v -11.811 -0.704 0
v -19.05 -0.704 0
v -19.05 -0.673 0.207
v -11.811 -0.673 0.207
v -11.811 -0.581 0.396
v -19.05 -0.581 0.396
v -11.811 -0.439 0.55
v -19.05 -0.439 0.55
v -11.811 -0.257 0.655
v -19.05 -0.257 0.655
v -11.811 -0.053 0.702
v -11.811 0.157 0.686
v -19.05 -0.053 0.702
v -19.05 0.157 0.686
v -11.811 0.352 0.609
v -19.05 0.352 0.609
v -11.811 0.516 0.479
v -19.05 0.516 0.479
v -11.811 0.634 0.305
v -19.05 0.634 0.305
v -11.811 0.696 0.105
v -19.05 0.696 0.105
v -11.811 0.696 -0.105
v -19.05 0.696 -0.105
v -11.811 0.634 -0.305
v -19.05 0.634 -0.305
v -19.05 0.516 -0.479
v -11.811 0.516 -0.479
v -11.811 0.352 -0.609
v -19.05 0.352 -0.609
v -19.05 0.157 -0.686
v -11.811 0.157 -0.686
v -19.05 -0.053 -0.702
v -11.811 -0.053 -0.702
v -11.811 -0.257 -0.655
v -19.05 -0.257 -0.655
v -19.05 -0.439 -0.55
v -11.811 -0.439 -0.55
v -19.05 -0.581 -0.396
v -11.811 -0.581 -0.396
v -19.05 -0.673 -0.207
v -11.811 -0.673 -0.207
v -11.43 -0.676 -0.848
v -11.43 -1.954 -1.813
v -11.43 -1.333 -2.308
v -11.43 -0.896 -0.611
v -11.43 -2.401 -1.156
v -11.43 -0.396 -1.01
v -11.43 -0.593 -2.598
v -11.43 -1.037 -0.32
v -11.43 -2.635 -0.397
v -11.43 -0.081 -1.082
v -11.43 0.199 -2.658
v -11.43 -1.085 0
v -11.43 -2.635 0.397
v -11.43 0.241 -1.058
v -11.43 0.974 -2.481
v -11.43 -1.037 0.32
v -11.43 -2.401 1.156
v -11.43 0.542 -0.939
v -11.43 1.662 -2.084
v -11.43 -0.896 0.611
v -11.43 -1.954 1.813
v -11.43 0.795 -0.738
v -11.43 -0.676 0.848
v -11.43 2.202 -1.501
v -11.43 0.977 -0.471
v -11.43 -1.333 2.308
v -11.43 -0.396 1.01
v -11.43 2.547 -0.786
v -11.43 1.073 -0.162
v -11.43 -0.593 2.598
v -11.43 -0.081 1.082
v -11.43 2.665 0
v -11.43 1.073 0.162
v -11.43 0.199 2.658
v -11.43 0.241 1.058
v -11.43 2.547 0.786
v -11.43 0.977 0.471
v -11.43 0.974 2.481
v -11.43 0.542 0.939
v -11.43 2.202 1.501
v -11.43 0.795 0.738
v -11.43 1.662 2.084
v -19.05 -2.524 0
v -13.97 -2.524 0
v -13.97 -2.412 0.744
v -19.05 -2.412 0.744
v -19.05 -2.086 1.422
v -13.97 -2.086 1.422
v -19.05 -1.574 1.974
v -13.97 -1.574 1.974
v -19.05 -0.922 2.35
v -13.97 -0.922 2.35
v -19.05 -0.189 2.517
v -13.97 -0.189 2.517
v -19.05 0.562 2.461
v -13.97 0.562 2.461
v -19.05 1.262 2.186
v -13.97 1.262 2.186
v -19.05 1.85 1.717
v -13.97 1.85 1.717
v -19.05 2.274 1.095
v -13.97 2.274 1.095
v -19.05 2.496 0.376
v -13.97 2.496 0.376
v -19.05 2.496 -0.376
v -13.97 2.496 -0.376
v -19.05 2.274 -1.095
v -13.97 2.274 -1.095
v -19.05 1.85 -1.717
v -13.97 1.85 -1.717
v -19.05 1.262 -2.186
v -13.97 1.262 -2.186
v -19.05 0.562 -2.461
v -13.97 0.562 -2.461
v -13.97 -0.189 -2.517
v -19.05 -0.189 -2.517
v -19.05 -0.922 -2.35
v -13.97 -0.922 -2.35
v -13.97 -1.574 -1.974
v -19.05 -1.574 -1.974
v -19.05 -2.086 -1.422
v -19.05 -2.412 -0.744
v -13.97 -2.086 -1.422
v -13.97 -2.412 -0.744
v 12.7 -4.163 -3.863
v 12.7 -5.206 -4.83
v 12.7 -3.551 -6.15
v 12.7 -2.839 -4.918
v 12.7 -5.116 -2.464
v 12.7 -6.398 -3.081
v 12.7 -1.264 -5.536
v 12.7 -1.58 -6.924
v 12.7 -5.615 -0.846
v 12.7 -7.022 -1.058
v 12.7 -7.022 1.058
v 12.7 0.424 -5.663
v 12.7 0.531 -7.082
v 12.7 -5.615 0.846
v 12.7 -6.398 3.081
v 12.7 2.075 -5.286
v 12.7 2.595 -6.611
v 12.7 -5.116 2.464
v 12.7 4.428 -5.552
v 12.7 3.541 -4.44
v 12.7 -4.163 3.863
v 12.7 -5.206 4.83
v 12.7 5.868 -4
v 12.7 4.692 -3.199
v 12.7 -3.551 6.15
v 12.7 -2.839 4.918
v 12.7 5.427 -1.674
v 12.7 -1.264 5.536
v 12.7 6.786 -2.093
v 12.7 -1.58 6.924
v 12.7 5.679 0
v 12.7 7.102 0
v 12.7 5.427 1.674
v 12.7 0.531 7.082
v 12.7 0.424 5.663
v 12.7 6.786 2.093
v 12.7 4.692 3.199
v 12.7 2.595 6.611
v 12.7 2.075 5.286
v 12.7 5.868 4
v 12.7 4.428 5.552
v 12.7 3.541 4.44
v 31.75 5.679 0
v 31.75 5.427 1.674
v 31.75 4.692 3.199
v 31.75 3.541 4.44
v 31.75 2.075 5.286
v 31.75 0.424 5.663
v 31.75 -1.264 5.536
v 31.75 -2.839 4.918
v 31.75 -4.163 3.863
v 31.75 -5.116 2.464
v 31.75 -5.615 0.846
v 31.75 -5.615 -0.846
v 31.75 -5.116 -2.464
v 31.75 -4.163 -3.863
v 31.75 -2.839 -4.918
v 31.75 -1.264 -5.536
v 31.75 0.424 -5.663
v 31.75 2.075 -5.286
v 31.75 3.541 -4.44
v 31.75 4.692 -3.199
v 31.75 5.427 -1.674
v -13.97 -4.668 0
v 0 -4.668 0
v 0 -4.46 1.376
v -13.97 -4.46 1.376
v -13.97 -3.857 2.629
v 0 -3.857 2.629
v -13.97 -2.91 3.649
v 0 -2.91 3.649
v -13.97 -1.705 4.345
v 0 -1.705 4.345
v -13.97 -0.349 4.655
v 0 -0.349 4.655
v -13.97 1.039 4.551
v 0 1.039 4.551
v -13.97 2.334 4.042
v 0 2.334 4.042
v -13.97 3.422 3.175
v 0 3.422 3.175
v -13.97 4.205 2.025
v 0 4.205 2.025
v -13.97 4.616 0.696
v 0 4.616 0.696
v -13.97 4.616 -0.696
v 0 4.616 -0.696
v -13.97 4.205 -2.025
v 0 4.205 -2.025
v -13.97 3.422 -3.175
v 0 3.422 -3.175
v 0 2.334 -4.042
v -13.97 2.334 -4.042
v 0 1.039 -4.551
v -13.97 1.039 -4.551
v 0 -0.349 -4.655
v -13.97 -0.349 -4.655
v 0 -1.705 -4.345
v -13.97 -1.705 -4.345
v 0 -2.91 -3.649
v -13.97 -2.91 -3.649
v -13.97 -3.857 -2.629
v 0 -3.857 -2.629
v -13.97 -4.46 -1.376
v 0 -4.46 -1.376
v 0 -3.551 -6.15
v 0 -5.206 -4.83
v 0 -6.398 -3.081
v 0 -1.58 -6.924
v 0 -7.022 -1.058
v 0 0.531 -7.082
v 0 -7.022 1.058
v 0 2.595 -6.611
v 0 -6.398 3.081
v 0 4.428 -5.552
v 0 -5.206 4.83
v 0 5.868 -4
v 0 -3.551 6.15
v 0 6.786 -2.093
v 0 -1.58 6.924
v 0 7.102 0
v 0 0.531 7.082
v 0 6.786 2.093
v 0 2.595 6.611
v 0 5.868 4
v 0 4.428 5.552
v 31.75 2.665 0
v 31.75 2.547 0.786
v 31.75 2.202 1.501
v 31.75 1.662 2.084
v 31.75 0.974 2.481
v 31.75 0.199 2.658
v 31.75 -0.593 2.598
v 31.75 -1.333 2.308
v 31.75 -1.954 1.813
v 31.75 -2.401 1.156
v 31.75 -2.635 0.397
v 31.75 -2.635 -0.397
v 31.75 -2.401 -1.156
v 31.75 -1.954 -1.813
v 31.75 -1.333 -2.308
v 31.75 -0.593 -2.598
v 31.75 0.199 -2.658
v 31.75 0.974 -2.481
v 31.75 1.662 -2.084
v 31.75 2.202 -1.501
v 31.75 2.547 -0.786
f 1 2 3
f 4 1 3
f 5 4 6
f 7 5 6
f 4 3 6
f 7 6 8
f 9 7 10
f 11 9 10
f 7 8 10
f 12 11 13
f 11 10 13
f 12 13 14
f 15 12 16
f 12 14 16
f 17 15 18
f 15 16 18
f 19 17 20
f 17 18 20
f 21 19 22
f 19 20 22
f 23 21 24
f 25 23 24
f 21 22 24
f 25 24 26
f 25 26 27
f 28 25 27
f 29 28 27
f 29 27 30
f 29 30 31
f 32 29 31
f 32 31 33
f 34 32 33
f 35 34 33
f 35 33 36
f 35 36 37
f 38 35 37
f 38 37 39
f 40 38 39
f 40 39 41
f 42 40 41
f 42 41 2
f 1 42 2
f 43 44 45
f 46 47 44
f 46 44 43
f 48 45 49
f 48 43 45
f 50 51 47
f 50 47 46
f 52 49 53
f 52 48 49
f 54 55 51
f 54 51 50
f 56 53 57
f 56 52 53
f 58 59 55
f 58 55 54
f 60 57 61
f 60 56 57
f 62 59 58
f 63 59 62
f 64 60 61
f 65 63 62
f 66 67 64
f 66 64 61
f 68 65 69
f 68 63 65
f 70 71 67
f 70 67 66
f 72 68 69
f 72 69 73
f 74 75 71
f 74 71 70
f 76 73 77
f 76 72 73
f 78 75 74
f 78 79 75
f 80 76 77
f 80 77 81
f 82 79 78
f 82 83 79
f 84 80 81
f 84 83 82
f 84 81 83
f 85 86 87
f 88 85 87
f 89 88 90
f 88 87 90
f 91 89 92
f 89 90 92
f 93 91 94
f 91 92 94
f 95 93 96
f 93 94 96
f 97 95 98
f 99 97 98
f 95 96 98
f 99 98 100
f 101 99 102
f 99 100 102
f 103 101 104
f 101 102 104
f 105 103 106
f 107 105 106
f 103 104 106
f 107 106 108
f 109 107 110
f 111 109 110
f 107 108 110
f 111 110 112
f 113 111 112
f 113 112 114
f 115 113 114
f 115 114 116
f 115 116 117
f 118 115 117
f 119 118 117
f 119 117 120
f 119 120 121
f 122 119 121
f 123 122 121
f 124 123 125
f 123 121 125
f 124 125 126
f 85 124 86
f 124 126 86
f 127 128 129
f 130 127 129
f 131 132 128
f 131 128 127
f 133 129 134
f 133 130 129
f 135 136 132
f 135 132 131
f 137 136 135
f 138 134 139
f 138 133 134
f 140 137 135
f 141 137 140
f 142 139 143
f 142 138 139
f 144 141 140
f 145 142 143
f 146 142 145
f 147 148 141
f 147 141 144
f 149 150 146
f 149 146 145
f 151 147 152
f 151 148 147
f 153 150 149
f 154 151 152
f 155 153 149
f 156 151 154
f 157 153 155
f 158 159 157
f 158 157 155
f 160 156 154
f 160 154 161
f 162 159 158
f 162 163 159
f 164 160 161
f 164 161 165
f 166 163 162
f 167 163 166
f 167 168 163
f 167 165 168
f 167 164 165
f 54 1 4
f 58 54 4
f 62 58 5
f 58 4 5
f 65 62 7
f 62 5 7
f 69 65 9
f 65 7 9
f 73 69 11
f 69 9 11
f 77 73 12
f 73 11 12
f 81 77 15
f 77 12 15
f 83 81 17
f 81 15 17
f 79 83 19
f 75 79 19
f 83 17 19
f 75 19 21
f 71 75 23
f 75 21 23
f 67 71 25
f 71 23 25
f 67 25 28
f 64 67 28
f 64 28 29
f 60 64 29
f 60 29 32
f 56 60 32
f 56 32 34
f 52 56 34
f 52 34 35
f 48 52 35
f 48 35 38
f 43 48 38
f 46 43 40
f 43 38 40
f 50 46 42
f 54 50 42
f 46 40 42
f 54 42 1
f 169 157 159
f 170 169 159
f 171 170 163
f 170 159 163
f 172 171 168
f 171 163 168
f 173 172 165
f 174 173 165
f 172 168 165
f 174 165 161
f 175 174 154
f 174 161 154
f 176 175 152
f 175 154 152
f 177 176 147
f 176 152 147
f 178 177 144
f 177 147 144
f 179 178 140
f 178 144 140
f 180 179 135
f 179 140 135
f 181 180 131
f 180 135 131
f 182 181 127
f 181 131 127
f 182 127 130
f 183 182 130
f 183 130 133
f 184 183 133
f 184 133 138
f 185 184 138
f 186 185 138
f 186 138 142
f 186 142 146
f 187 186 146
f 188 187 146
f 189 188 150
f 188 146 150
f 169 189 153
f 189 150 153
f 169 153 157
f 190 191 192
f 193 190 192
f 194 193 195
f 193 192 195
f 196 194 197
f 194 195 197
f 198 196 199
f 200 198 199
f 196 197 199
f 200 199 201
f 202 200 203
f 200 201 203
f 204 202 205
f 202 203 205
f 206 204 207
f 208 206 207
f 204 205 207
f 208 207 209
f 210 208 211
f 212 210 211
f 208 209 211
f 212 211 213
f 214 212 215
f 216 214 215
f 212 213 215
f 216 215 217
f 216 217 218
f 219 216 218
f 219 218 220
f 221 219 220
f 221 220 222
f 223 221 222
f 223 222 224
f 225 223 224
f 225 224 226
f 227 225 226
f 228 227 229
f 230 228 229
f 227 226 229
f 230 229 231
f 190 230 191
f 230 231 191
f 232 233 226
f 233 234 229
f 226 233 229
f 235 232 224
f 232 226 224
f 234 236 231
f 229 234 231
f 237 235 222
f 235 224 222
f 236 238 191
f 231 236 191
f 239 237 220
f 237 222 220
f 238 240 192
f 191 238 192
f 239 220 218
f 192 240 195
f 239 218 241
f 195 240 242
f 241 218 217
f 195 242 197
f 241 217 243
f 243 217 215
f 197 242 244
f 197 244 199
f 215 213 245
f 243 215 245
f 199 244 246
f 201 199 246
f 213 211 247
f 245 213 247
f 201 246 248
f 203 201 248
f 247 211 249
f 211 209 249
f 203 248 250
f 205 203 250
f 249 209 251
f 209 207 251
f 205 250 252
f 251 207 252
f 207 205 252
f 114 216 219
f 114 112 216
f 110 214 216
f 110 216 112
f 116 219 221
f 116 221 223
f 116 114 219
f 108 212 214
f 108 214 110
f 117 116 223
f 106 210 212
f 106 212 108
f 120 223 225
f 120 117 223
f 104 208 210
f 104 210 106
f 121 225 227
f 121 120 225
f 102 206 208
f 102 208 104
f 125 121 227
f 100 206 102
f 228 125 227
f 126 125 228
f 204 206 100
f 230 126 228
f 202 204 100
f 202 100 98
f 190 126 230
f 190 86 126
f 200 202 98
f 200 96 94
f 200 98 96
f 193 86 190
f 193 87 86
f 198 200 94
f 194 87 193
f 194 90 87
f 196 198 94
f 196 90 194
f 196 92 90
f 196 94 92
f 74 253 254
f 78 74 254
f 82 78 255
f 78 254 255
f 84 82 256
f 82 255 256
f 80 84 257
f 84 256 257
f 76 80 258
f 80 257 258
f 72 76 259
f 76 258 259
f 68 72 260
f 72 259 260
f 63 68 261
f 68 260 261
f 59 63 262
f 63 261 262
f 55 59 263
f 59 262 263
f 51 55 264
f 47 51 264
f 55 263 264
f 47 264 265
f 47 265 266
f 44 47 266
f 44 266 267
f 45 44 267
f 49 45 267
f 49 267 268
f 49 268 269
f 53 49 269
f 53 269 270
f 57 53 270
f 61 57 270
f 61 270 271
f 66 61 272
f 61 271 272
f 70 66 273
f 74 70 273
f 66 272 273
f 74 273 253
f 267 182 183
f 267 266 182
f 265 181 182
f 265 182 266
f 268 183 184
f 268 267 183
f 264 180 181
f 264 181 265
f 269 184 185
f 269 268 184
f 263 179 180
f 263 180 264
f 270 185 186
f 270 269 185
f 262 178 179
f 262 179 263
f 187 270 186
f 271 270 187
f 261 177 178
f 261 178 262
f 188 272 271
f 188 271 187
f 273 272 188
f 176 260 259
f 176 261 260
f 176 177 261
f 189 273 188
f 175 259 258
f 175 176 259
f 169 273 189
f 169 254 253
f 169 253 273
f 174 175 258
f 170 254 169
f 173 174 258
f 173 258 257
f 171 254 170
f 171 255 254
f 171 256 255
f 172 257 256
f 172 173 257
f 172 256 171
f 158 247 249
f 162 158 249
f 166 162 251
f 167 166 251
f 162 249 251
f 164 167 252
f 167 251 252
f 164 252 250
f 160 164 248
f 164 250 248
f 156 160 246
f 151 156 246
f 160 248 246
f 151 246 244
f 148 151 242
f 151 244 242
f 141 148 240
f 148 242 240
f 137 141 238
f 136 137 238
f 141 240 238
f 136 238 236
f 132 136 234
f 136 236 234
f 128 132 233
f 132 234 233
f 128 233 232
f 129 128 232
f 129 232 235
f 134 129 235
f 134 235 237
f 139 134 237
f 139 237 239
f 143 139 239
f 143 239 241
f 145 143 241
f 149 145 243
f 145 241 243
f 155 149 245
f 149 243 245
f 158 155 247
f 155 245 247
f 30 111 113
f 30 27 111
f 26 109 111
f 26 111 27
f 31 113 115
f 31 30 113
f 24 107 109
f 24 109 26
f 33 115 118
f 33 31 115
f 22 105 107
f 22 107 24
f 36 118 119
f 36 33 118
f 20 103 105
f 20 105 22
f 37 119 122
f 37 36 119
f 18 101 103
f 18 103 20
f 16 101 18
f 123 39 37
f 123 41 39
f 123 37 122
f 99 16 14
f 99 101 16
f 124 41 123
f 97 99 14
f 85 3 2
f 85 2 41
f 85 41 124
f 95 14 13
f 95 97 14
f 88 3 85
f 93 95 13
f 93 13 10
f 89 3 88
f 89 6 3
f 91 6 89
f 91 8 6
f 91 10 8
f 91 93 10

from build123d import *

# Parameters (mm, degrees)
F0_R      = 7.1015967563
F1_DEPTH  = 12.7
F2_R      = 5.6788395521
F3_DEPTH  = 19.05
F4_R      = 4.6676560737
F5_DEPTH  = 13.97
F6_R      = 2.5243045871
F7_DEPTH  = 5.08
F8_R      = 2.6650653171
F9_DEPTH  = 43.18
F10_R     = 0.7037770969
F11_DEPTH = 25.4
F12_SIZE  = 0.381


# Not quite as in the source:
# - the program builds the solid bodies; features that only make, move or delete a surface that nothing else refers to are left out


with BuildPart() as f1:
    # F0 (on Right) → F1 (new body)
    with BuildSketch(Plane.YZ):
        Circle(F0_R)
    extrude(amount=F1_DEPTH)

    # F2 (on face) → F3 (join)
    with BuildSketch(Plane.YZ.offset(12.7)):
        Circle(F2_R)
    extrude(amount=F3_DEPTH)

    # F4 (on face) → F5 (join)
    with BuildSketch(Plane(origin=(0, 0, 0), x_dir=(0, -1, 0), z_dir=(-1, 0, 0))):
        Circle(F4_R)
    extrude(amount=F5_DEPTH)

    # F6 (on face) → F7 (join)
    with BuildSketch(Plane(origin=(-13.97, 0, 0), x_dir=(0, -1, 0), z_dir=(-1, 0, 0))):
        Circle(F6_R)
    extrude(amount=F7_DEPTH)

    # F8 (on face) → F9 (cut)
    with BuildSketch(Plane.YZ.offset(31.75)):
        Circle(F8_R)
    extrude(amount=-F9_DEPTH, mode=Mode.SUBTRACT)

    # F10 (on face) → F11 (cut)
    with BuildSketch(Plane(origin=(-19.05, 0, 0), x_dir=(0, -1, 0), z_dir=(-1, 0, 0))):
        Circle(F10_R)
    extrude(amount=-F11_DEPTH, mode=Mode.SUBTRACT)

    # F12
    f12_edges = [f1.edges().sort_by_distance(p)[0] for p in [
        (-11.43, 0.703777, 0),
    ]]
    chamfer(f12_edges, length=F12_SIZE)


solid = f1.part
